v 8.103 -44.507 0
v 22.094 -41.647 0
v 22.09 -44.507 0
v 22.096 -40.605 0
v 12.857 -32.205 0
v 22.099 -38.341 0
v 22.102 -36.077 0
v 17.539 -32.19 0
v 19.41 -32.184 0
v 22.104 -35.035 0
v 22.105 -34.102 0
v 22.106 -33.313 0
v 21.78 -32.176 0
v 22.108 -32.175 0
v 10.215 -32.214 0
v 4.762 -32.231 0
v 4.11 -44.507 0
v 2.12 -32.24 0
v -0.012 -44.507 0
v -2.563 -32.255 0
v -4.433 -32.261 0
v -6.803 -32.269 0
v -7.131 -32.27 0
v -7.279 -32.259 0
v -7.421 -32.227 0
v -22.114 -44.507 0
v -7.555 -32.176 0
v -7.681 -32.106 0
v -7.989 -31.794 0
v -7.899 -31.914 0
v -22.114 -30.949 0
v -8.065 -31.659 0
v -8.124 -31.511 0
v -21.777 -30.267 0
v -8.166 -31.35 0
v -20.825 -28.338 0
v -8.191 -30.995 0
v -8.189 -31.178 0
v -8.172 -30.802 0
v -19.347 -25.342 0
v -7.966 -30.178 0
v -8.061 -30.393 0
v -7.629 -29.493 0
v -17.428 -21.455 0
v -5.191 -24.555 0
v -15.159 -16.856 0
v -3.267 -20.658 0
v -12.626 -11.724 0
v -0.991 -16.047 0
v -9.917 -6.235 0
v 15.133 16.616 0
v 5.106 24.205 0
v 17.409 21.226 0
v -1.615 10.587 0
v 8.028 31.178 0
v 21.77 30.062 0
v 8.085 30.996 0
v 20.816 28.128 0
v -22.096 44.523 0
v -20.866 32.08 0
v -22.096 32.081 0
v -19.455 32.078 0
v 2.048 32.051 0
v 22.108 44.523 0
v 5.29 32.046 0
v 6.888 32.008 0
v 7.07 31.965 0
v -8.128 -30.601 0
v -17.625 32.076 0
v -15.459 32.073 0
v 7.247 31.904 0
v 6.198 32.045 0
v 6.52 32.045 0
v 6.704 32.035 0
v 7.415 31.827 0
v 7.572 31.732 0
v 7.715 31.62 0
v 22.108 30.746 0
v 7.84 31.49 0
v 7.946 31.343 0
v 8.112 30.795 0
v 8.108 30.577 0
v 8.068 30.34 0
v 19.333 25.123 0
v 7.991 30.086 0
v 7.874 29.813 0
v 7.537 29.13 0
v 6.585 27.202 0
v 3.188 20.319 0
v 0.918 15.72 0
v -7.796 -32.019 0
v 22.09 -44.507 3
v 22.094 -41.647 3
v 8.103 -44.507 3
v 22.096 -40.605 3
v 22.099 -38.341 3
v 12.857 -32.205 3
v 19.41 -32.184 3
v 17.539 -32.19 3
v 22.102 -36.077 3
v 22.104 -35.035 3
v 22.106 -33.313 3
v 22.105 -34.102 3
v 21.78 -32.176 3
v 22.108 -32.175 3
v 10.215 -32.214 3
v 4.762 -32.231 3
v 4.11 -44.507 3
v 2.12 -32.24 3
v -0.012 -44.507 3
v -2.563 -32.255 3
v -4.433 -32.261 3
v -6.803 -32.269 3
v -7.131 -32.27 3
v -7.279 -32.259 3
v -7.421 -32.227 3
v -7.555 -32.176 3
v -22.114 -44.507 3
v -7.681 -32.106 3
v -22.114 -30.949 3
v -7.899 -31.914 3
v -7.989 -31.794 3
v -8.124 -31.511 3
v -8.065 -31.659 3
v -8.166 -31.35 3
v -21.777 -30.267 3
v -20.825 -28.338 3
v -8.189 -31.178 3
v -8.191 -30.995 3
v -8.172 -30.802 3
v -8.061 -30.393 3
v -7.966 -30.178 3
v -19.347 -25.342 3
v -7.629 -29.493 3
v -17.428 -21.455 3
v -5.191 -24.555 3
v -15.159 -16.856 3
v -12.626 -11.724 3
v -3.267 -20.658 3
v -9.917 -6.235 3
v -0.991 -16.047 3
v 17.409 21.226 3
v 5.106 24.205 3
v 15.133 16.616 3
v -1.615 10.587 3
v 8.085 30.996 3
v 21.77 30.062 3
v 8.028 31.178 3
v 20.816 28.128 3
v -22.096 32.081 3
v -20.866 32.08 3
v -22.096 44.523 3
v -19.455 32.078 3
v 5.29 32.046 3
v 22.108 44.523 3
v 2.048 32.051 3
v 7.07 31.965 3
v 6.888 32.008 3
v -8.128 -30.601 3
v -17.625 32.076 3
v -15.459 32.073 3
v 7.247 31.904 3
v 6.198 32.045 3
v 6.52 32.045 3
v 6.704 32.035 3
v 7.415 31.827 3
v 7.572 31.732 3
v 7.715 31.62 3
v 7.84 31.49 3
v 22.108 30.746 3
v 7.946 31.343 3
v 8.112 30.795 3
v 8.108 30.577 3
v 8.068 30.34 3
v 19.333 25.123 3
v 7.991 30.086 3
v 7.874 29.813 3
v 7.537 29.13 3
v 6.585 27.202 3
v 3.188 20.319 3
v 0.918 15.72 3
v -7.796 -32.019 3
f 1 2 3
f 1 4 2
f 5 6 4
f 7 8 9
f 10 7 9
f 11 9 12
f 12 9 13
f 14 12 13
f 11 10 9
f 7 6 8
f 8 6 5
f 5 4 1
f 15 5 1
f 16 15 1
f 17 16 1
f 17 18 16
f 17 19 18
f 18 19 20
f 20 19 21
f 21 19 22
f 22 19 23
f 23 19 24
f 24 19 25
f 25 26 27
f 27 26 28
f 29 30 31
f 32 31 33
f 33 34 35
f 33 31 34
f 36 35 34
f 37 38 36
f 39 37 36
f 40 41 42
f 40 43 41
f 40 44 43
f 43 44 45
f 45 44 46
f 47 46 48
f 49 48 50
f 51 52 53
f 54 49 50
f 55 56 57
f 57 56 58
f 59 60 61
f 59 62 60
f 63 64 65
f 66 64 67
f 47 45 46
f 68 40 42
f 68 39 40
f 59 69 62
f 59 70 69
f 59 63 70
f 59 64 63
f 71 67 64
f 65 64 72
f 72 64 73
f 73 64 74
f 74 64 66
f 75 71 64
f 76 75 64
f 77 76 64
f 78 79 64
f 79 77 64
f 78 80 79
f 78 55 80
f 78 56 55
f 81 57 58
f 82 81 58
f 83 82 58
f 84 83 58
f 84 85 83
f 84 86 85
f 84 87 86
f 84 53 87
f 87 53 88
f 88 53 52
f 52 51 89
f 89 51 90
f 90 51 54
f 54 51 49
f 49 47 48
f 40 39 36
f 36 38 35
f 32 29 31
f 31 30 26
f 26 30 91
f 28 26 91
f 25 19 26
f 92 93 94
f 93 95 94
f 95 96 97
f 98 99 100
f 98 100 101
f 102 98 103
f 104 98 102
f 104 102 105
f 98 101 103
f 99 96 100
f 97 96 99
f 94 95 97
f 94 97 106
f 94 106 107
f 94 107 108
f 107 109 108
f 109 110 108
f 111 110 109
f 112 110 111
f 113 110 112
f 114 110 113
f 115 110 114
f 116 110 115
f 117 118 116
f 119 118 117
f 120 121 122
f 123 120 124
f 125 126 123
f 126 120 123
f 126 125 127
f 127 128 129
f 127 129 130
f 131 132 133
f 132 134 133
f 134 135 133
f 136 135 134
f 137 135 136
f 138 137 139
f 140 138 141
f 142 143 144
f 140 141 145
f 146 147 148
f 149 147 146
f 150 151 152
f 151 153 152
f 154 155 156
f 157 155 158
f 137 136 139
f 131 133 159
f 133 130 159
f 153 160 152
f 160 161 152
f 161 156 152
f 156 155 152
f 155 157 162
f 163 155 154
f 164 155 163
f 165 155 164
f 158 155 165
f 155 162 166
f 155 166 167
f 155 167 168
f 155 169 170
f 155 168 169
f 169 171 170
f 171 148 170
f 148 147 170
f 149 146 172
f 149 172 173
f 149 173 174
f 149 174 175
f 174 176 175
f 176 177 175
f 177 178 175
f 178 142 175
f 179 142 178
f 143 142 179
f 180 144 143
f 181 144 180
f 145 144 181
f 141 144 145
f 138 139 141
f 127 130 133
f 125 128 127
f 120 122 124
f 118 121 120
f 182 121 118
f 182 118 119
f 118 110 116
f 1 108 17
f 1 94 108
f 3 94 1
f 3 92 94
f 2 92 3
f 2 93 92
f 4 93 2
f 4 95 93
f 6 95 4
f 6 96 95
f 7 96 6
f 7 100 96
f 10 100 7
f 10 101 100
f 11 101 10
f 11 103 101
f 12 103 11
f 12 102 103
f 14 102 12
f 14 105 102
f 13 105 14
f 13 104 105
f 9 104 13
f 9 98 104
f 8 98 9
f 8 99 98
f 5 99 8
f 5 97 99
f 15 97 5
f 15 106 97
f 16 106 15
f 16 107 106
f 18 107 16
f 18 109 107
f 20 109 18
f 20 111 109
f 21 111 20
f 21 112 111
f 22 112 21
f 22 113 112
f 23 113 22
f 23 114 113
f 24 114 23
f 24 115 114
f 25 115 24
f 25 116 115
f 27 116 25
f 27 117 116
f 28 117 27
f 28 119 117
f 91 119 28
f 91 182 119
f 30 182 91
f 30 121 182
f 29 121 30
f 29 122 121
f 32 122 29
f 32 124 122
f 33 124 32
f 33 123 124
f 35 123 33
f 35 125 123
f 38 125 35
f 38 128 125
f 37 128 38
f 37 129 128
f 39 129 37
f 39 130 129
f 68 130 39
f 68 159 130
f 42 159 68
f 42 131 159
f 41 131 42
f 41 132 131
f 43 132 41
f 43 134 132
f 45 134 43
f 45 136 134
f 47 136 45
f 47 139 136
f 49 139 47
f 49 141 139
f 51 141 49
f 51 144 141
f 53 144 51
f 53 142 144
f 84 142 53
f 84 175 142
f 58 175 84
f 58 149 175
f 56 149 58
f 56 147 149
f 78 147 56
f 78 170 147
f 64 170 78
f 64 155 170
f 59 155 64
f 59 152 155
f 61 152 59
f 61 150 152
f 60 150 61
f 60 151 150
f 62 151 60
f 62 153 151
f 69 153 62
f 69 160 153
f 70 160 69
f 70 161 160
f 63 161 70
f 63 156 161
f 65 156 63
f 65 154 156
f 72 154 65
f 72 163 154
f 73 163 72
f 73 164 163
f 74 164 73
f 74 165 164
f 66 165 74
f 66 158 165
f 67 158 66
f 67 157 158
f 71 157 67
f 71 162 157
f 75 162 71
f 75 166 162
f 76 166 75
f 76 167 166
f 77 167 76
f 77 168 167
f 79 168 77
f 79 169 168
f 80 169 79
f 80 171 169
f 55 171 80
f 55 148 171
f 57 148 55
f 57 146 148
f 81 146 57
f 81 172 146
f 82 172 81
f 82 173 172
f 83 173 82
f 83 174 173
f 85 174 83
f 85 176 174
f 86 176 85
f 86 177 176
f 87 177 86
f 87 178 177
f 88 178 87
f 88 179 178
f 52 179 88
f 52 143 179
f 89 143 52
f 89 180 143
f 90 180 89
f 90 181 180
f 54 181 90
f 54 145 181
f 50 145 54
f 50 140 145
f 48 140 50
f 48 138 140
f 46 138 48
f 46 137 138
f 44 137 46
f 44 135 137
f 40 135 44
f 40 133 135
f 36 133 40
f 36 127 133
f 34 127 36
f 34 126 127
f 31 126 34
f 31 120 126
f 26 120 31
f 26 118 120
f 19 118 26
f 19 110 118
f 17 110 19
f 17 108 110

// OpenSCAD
// Generated from 交通部公路局（原交通部公路總局）「新式號牌使用之英文字、數字字體」author trace
fudge = 0.1;

module glyph_2012_Z(h = 3) {
  difference() {
    linear_extrude(height = h)
      polygon(points = [[-22.0957, 44.5229], [-22.0957, 44.3832], [-22.0957, 43.9883], [-22.0957, 43.3747], [-22.0957, 42.5789], [-22.0957, 41.6373], [-22.0957, 40.5863], [-22.0957, 39.4625], [-22.0957, 38.3022], [-22.0957, 37.1418], [-22.0957, 36.018], [-22.0957, 34.967], [-22.0957, 34.0254], [-22.0957, 33.2296], [-22.0957, 32.616], [-22.0957, 32.2211], [-22.0957, 32.0814], [-21.7744, 32.081], [-20.8662, 32.0799], [-19.4549, 32.0781], [-17.6246, 32.0757], [-15.4589, 32.073], [-13.0416, 32.0699], [-10.4567, 32.0666], [-7.788, 32.0632], [-5.1193, 32.0598], [-2.5344, 32.0565], [-0.1172, 32.0534], [2.0485, 32.0506], [3.8789, 32.0483], [5.2901, 32.0465], [6.1983, 32.0453], [6.5197, 32.0449], [6.7038, 32.0351], [6.8883, 32.0084], [7.0704, 31.9649], [7.247, 31.9044], [7.4153, 31.8267], [7.5723, 31.7319], [7.715, 31.6197], [7.8405, 31.4901], [7.9459, 31.343], [8.0283, 31.1782], [8.0846, 30.9957], [8.1121, 30.7952], [8.1076, 30.5769], [8.0683, 30.3404], [7.9913, 30.0857], [7.8736, 29.8128], [7.5368, 29.1304], [6.5851, 27.2019], [5.1062, 24.2054], [3.188, 20.3187], [0.9185, 15.72], [-1.6147, 10.5873], [-4.3235, 5.0986], [-7.1202, -0.5682], [-9.9169, -6.235], [-12.6258, -11.7237], [-15.1589, -16.8565], [-17.4285, -21.4551], [-19.3466, -25.3418], [-20.8255, -28.3383], [-21.7772, -30.2668], [-22.114, -30.9492], [-22.114, -31.1015], [-22.114, -31.5318], [-22.114, -32.2004], [-22.114, -33.0676], [-22.114, -34.0937], [-22.114, -35.2389], [-22.114, -36.4636], [-22.114, -37.728], [-22.114, -38.9924], [-22.114, -40.2171], [-22.114, -41.3623], [-22.114, -42.3884], [-22.114, -43.2556], [-22.114, -43.9242], [-22.114, -44.3545], [-22.114, -44.5068], [-21.6176, -44.5068], [-20.2146, -44.5068], [-18.0347, -44.5068], [-15.2072, -44.5068], [-11.8617, -44.5068], [-8.1277, -44.5068], [-4.1346, -44.5068], [-0.0121, -44.5068], [4.1104, -44.5067], [8.1034, -44.5068], [11.8375, -44.5068], [15.183, -44.5068], [18.0105, -44.5068], [20.1904, -44.5068], [21.5934, -44.5068], [22.0898, -44.5068], [22.09, -44.3683], [22.0906, -43.9769], [22.0915, -43.3687], [22.0927, -42.5799], [22.0941, -41.6466], [22.0956, -40.6049], [22.0973, -39.491], [22.099, -38.3409], [22.1007, -37.1908], [22.1023, -36.0769], [22.1039, -35.0352], [22.1053, -34.1019], [22.1064, -33.3131], [22.1073, -32.7049], [22.1079, -32.3135], [22.1081, -32.175], [21.7797, -32.1761], [20.8517, -32.1791], [19.4098, -32.1838], [17.5395, -32.1898], [15.3265, -32.197], [12.8566, -32.205], [10.2154, -32.2136], [7.4885, -32.2224], [4.7616, -32.2312], [2.1203, -32.2398], [-0.3496, -32.2478], [-2.5626, -32.255], [-4.4328, -32.261], [-5.8748, -32.2657], [-6.8028, -32.2687], [-7.1312, -32.2697], [-7.279, -32.259], [-7.4208, -32.2275], [-7.5552, -32.1763], [-7.6807, -32.1063], [-7.7959, -32.0186], [-7.8993, -31.9142], [-7.9895, -31.7941], [-8.065, -31.6594], [-8.1244, -31.5111], [-8.1662, -31.3502], [-8.1889, -31.1778], [-8.1912, -30.9948], [-8.1716, -30.8022], [-8.1285, -30.6012], [-8.0607, -30.3927], [-7.9665, -30.1777], [-7.6288, -29.4935], [-6.6743, -27.5599], [-5.1911, -24.5554], [-3.2674, -20.6584], [-0.9912, -16.0475], [1.5493, -10.9011], [4.266, -5.3978], [7.0708, 0.284], [9.8756, 5.9659], [12.5923, 11.4692], [15.1328, 16.6156], [17.4089, 21.2265], [19.3327, 25.1235], [20.8158, 28.128], [21.7704, 30.0616], [22.1081, 30.7458], [22.1081, 30.9005], [22.1081, 31.3378], [22.1081, 32.0172], [22.1081, 32.8985], [22.1081, 33.9412], [22.1081, 35.105], [22.1081, 36.3495], [22.1081, 37.6343], [22.1081, 38.9192], [22.1081, 40.1637], [22.1081, 41.3275], [22.1081, 42.3702], [22.1081, 43.2515], [22.1081, 43.9309], [22.1081, 44.3682], [22.1081, 44.5229], [21.6117, 44.5229], [20.2087, 44.5229], [18.0288, 44.5229], [15.2013, 44.5229], [11.8558, 44.5229], [8.1217, 44.5229], [4.1287, 44.5229], [0.0062, 44.5229], [-4.1163, 44.5229], [-8.1094, 44.5229], [-11.8434, 44.5229], [-15.1889, 44.5229], [-18.0164, 44.5229], [-20.1963, 44.5229], [-21.5993, 44.5229]]);
  }
}

glyph_2012_Z();
